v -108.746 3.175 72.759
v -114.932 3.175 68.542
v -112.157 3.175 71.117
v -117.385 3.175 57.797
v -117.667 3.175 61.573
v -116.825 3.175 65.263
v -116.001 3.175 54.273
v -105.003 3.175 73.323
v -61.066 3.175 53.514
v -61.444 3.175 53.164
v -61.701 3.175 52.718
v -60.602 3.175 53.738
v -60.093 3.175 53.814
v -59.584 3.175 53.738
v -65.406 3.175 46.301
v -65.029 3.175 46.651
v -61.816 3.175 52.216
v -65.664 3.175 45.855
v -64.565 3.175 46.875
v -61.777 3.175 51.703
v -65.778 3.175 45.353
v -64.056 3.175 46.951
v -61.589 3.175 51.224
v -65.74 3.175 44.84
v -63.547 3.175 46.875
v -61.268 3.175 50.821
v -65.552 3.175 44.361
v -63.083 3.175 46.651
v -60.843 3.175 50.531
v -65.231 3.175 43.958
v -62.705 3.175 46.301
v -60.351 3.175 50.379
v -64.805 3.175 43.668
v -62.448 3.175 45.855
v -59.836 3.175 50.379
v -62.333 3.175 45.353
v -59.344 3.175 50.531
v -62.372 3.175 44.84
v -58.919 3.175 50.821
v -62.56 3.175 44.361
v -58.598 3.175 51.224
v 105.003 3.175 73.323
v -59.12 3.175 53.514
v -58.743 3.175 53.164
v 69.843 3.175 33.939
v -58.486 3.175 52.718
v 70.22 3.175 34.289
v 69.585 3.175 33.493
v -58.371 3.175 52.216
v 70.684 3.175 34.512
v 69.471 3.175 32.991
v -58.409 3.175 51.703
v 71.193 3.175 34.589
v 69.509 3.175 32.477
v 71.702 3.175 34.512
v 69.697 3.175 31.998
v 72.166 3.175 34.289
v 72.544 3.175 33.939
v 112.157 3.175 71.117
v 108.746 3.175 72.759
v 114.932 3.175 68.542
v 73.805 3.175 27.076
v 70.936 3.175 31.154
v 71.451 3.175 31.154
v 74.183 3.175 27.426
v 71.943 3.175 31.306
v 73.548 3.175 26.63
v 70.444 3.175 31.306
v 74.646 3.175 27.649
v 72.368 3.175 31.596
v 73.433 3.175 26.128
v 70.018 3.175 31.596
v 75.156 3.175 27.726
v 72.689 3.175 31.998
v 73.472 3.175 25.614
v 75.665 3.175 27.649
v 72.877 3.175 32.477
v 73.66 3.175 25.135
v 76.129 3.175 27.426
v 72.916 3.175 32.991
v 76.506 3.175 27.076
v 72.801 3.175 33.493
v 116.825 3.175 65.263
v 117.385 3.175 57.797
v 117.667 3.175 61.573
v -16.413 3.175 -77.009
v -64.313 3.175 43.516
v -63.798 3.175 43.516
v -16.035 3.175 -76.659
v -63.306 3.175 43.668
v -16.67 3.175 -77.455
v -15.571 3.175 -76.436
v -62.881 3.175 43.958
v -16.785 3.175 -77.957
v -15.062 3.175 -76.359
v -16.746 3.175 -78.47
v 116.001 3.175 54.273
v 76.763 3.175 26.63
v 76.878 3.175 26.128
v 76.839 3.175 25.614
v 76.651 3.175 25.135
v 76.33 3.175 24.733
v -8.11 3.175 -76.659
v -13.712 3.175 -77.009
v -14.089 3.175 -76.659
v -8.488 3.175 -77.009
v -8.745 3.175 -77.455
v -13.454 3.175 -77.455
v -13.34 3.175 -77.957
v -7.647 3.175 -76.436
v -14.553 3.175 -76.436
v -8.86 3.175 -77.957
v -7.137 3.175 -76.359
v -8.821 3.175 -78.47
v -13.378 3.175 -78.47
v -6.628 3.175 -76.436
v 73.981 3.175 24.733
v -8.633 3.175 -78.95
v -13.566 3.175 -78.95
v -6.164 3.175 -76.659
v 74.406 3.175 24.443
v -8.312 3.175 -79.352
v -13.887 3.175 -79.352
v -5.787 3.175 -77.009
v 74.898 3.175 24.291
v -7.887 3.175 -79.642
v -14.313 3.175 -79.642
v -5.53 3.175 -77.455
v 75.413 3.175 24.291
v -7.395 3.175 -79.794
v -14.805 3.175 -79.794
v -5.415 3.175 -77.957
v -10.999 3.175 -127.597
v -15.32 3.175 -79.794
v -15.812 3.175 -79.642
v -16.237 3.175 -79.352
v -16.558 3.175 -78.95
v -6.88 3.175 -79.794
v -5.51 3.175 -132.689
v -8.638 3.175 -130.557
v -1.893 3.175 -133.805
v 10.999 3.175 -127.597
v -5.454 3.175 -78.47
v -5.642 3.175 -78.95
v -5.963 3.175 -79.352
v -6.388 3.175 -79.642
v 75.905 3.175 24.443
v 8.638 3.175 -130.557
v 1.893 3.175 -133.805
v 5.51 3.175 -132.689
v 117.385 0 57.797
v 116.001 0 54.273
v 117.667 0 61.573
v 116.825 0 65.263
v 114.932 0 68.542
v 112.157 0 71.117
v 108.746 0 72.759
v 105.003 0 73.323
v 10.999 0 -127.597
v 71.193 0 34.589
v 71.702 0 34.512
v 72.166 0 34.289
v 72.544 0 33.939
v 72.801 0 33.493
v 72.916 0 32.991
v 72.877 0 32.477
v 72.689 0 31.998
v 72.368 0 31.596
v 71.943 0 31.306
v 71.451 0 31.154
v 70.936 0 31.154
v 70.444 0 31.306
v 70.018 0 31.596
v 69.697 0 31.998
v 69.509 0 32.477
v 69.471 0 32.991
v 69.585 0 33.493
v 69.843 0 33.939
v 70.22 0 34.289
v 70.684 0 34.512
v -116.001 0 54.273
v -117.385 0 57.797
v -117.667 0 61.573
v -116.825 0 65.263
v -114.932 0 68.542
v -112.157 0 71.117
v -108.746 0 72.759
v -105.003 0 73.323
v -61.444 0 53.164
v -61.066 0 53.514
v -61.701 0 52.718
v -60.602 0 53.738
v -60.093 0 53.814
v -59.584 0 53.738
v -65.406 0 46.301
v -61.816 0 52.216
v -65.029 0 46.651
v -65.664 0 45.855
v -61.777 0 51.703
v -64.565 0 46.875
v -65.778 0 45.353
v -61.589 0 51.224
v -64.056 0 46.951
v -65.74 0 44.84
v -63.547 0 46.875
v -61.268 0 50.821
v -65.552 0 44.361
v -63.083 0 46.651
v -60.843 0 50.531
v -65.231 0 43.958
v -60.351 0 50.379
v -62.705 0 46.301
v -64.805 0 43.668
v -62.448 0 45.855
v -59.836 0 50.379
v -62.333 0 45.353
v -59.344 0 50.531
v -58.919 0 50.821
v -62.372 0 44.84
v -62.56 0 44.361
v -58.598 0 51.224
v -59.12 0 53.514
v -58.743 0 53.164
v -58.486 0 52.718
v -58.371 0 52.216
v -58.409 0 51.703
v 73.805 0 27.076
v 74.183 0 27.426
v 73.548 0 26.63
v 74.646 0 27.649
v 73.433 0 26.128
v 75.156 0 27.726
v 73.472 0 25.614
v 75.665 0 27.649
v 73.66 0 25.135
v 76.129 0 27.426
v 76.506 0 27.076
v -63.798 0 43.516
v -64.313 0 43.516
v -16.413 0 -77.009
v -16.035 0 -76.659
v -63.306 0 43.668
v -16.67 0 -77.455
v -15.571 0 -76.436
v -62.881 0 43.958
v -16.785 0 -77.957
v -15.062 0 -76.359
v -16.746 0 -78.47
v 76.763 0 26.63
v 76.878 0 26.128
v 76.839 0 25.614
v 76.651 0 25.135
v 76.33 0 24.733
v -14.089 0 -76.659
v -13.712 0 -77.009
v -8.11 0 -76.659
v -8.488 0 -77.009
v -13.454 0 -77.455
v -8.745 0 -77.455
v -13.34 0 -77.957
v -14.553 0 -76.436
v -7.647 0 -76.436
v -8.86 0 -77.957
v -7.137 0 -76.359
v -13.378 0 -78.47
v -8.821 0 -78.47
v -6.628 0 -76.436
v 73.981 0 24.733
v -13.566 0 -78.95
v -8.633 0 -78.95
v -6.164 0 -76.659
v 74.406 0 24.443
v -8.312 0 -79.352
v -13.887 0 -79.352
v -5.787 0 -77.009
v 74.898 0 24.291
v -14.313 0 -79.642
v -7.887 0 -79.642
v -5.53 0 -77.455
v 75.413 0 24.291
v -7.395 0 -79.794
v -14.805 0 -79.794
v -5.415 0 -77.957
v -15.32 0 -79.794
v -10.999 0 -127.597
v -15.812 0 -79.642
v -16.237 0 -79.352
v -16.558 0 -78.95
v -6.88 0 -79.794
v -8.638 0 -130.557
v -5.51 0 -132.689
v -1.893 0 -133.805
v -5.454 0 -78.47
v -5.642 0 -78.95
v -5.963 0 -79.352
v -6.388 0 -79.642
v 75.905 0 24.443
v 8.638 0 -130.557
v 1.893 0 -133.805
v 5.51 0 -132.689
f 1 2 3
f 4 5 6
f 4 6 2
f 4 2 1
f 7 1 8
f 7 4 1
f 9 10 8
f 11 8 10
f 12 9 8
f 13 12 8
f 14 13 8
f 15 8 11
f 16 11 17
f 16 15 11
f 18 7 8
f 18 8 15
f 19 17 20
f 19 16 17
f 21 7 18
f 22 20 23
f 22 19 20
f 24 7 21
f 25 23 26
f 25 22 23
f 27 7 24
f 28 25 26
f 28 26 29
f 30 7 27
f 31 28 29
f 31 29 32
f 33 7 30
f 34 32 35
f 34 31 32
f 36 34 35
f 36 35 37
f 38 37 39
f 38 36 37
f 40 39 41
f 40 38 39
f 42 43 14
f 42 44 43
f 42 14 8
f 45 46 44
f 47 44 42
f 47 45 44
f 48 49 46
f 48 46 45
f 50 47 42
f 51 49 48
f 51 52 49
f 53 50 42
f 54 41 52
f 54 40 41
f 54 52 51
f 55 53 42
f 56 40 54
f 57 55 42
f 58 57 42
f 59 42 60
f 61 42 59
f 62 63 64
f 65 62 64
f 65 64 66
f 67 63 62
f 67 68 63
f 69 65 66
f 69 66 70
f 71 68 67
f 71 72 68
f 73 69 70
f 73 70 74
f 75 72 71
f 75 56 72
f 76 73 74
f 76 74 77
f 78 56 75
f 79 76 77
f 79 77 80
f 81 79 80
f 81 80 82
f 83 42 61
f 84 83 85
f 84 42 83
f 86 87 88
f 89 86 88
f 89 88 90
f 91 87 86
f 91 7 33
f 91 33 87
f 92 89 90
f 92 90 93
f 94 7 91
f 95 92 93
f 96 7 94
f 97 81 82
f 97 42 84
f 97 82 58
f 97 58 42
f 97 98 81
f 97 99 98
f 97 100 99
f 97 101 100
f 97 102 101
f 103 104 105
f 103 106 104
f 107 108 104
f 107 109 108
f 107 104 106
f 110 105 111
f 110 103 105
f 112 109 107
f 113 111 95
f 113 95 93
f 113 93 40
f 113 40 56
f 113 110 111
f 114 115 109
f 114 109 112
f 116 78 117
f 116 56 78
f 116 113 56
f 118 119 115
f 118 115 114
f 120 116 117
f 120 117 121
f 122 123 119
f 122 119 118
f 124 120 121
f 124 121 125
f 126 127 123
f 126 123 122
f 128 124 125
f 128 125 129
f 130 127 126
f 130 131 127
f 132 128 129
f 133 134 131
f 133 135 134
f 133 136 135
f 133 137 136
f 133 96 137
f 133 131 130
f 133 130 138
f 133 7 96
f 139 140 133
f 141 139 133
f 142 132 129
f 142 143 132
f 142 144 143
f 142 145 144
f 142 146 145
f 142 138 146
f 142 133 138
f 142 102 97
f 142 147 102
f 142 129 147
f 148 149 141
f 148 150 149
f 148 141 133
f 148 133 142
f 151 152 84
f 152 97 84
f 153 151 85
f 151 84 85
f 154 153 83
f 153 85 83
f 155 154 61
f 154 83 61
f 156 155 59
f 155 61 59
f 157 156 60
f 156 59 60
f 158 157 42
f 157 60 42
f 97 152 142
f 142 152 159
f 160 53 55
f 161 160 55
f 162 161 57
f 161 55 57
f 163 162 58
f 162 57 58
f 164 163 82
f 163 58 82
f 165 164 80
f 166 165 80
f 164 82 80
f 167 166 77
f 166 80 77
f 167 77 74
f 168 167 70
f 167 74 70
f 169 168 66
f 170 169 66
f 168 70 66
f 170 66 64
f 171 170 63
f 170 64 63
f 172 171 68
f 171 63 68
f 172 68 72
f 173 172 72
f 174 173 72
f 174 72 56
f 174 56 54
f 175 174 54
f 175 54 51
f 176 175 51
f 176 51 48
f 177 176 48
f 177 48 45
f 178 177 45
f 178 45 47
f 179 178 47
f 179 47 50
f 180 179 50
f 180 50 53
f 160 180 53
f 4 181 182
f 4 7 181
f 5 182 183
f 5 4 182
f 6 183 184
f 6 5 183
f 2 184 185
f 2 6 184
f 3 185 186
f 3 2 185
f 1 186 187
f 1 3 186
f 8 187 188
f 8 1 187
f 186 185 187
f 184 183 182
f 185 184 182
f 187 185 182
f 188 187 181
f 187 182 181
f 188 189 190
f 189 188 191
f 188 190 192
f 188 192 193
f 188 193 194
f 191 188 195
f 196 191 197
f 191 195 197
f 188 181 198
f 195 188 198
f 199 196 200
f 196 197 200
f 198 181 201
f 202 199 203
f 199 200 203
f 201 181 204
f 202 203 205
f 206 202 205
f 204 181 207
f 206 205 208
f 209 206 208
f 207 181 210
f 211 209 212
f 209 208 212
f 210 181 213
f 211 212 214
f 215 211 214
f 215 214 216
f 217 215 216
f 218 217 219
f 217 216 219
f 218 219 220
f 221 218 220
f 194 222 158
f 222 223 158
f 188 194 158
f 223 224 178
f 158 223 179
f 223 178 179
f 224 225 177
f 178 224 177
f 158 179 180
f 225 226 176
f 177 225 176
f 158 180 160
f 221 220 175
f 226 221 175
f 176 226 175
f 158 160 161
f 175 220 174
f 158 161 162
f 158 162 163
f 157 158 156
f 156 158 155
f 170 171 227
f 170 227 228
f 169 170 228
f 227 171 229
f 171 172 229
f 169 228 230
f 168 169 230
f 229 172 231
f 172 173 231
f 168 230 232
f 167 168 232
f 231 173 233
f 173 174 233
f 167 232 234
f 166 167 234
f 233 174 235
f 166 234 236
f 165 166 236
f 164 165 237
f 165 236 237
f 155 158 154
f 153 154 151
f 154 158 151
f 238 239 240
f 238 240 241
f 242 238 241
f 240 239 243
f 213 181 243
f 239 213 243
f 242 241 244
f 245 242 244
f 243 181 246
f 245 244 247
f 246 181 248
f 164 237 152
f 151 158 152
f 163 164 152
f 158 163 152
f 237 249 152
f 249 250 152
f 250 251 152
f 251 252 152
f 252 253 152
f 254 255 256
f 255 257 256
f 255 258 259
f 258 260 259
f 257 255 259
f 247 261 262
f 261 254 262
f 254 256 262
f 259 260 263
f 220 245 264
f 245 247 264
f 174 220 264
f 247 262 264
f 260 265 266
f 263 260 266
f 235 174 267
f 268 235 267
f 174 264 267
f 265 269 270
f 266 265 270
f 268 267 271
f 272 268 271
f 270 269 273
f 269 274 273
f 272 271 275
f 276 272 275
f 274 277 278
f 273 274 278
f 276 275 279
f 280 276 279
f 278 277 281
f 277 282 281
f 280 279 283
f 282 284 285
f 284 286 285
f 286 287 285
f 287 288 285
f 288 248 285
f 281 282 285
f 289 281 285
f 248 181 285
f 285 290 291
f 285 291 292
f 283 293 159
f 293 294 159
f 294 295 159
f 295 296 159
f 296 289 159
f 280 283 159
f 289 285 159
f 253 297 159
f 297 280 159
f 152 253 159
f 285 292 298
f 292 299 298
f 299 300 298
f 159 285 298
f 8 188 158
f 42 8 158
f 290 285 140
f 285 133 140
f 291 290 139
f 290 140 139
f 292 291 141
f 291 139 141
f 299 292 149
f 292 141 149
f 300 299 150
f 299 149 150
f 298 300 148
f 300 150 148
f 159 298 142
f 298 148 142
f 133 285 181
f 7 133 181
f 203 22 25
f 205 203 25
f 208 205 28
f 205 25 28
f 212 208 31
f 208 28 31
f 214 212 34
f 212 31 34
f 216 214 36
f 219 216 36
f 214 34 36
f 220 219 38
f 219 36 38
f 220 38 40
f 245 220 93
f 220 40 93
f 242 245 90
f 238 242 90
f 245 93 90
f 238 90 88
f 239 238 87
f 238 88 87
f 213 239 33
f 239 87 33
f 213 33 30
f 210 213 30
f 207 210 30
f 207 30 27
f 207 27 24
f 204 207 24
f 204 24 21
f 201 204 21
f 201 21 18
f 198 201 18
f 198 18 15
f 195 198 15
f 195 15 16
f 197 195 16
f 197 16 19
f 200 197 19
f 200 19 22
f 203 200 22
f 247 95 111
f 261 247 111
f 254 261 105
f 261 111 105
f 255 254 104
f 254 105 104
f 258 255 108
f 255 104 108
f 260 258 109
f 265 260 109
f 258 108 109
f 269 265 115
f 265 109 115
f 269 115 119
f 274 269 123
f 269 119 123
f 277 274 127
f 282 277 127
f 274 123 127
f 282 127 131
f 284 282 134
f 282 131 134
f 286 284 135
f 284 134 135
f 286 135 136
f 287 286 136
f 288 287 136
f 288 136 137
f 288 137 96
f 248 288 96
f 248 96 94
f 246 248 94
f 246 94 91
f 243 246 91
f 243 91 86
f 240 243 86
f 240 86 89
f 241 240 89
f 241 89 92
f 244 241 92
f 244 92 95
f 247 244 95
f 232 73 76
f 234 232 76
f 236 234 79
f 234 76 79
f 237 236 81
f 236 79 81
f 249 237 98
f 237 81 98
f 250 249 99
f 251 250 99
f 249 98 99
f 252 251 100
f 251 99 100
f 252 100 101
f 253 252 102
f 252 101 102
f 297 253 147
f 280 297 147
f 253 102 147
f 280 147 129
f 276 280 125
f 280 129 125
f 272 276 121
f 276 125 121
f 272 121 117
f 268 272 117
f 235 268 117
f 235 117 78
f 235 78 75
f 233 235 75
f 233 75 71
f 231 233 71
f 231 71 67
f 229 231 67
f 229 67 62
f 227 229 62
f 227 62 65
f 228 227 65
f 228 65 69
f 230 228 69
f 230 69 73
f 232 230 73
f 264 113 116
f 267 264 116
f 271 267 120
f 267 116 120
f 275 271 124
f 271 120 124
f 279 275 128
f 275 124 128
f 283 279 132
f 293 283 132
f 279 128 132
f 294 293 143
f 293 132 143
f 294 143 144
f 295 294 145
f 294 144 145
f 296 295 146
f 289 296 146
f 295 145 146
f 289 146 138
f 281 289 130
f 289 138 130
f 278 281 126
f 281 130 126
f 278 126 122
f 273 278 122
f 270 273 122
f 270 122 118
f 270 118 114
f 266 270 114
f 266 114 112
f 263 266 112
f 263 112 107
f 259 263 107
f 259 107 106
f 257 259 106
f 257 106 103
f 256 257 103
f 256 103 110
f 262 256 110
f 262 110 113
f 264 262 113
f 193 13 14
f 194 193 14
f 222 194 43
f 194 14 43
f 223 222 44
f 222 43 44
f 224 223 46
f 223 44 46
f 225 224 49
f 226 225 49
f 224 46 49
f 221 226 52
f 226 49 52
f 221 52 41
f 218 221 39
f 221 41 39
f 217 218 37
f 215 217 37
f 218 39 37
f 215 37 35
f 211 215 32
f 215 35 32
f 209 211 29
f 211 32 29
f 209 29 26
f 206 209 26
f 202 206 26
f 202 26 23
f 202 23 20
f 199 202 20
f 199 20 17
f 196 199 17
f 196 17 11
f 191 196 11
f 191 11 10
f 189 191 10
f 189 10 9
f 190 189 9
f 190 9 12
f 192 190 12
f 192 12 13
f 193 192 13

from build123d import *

# Parameters (mm, degrees)
BOSS_EXTRUDE1_DEPTH = 3.175
SKETCH2_R           = 1.7272
CUT_EXTRUDE1_DEPTH  = 195.021684248
FILLET1_R           = 12.7


with BuildPart() as part:
    # Sketch1 → Boss-Extrude1 (new body)
    with BuildSketch(Plane(origin=(0, 0, 0), x_dir=(1, 0, 0), z_dir=(0, 1, 0))):
        Polygon((0, 146.646968374), (-127, -73.323484187), (127, -73.323484187), align=None)
    extrude(amount=BOSS_EXTRUDE1_DEPTH)

    # Sketch2 → Cut-Extrude1 (cut, through all)
    with BuildSketch(Plane(origin=(0, 3.175, 0), x_dir=(1, 0, 0), z_dir=(0, 1, 0))):
        with Locations((71.193145986, -32.861822377)):
            Circle(SKETCH2_R)
        with Locations((75.155545986, -25.998744257)):
            Circle(SKETCH2_R)
        with Locations((-64.055745986, -45.224161811)):
            Circle(SKETCH2_R)
        with Locations((-60.093345986, -52.08723993)):
            Circle(SKETCH2_R)
        with Locations((-7.1374, 78.085984187)):
            Circle(SKETCH2_R)
        with Locations((-15.0622, 78.085984187)):
            Circle(SKETCH2_R)
    extrude(amount=-CUT_EXTRUDE1_DEPTH, mode=Mode.SUBTRACT)

    # Fillet1
    fillet1_edges = [part.edges().sort_by_distance(p)[0] for p in [
        (127, 1.5875, 73.323484187),
        (-127, 1.5875, 73.323484187),
        (0, 1.5875, -146.646968374),
    ]]
    fillet(fillet1_edges, radius=FILLET1_R)


solid = part.part
